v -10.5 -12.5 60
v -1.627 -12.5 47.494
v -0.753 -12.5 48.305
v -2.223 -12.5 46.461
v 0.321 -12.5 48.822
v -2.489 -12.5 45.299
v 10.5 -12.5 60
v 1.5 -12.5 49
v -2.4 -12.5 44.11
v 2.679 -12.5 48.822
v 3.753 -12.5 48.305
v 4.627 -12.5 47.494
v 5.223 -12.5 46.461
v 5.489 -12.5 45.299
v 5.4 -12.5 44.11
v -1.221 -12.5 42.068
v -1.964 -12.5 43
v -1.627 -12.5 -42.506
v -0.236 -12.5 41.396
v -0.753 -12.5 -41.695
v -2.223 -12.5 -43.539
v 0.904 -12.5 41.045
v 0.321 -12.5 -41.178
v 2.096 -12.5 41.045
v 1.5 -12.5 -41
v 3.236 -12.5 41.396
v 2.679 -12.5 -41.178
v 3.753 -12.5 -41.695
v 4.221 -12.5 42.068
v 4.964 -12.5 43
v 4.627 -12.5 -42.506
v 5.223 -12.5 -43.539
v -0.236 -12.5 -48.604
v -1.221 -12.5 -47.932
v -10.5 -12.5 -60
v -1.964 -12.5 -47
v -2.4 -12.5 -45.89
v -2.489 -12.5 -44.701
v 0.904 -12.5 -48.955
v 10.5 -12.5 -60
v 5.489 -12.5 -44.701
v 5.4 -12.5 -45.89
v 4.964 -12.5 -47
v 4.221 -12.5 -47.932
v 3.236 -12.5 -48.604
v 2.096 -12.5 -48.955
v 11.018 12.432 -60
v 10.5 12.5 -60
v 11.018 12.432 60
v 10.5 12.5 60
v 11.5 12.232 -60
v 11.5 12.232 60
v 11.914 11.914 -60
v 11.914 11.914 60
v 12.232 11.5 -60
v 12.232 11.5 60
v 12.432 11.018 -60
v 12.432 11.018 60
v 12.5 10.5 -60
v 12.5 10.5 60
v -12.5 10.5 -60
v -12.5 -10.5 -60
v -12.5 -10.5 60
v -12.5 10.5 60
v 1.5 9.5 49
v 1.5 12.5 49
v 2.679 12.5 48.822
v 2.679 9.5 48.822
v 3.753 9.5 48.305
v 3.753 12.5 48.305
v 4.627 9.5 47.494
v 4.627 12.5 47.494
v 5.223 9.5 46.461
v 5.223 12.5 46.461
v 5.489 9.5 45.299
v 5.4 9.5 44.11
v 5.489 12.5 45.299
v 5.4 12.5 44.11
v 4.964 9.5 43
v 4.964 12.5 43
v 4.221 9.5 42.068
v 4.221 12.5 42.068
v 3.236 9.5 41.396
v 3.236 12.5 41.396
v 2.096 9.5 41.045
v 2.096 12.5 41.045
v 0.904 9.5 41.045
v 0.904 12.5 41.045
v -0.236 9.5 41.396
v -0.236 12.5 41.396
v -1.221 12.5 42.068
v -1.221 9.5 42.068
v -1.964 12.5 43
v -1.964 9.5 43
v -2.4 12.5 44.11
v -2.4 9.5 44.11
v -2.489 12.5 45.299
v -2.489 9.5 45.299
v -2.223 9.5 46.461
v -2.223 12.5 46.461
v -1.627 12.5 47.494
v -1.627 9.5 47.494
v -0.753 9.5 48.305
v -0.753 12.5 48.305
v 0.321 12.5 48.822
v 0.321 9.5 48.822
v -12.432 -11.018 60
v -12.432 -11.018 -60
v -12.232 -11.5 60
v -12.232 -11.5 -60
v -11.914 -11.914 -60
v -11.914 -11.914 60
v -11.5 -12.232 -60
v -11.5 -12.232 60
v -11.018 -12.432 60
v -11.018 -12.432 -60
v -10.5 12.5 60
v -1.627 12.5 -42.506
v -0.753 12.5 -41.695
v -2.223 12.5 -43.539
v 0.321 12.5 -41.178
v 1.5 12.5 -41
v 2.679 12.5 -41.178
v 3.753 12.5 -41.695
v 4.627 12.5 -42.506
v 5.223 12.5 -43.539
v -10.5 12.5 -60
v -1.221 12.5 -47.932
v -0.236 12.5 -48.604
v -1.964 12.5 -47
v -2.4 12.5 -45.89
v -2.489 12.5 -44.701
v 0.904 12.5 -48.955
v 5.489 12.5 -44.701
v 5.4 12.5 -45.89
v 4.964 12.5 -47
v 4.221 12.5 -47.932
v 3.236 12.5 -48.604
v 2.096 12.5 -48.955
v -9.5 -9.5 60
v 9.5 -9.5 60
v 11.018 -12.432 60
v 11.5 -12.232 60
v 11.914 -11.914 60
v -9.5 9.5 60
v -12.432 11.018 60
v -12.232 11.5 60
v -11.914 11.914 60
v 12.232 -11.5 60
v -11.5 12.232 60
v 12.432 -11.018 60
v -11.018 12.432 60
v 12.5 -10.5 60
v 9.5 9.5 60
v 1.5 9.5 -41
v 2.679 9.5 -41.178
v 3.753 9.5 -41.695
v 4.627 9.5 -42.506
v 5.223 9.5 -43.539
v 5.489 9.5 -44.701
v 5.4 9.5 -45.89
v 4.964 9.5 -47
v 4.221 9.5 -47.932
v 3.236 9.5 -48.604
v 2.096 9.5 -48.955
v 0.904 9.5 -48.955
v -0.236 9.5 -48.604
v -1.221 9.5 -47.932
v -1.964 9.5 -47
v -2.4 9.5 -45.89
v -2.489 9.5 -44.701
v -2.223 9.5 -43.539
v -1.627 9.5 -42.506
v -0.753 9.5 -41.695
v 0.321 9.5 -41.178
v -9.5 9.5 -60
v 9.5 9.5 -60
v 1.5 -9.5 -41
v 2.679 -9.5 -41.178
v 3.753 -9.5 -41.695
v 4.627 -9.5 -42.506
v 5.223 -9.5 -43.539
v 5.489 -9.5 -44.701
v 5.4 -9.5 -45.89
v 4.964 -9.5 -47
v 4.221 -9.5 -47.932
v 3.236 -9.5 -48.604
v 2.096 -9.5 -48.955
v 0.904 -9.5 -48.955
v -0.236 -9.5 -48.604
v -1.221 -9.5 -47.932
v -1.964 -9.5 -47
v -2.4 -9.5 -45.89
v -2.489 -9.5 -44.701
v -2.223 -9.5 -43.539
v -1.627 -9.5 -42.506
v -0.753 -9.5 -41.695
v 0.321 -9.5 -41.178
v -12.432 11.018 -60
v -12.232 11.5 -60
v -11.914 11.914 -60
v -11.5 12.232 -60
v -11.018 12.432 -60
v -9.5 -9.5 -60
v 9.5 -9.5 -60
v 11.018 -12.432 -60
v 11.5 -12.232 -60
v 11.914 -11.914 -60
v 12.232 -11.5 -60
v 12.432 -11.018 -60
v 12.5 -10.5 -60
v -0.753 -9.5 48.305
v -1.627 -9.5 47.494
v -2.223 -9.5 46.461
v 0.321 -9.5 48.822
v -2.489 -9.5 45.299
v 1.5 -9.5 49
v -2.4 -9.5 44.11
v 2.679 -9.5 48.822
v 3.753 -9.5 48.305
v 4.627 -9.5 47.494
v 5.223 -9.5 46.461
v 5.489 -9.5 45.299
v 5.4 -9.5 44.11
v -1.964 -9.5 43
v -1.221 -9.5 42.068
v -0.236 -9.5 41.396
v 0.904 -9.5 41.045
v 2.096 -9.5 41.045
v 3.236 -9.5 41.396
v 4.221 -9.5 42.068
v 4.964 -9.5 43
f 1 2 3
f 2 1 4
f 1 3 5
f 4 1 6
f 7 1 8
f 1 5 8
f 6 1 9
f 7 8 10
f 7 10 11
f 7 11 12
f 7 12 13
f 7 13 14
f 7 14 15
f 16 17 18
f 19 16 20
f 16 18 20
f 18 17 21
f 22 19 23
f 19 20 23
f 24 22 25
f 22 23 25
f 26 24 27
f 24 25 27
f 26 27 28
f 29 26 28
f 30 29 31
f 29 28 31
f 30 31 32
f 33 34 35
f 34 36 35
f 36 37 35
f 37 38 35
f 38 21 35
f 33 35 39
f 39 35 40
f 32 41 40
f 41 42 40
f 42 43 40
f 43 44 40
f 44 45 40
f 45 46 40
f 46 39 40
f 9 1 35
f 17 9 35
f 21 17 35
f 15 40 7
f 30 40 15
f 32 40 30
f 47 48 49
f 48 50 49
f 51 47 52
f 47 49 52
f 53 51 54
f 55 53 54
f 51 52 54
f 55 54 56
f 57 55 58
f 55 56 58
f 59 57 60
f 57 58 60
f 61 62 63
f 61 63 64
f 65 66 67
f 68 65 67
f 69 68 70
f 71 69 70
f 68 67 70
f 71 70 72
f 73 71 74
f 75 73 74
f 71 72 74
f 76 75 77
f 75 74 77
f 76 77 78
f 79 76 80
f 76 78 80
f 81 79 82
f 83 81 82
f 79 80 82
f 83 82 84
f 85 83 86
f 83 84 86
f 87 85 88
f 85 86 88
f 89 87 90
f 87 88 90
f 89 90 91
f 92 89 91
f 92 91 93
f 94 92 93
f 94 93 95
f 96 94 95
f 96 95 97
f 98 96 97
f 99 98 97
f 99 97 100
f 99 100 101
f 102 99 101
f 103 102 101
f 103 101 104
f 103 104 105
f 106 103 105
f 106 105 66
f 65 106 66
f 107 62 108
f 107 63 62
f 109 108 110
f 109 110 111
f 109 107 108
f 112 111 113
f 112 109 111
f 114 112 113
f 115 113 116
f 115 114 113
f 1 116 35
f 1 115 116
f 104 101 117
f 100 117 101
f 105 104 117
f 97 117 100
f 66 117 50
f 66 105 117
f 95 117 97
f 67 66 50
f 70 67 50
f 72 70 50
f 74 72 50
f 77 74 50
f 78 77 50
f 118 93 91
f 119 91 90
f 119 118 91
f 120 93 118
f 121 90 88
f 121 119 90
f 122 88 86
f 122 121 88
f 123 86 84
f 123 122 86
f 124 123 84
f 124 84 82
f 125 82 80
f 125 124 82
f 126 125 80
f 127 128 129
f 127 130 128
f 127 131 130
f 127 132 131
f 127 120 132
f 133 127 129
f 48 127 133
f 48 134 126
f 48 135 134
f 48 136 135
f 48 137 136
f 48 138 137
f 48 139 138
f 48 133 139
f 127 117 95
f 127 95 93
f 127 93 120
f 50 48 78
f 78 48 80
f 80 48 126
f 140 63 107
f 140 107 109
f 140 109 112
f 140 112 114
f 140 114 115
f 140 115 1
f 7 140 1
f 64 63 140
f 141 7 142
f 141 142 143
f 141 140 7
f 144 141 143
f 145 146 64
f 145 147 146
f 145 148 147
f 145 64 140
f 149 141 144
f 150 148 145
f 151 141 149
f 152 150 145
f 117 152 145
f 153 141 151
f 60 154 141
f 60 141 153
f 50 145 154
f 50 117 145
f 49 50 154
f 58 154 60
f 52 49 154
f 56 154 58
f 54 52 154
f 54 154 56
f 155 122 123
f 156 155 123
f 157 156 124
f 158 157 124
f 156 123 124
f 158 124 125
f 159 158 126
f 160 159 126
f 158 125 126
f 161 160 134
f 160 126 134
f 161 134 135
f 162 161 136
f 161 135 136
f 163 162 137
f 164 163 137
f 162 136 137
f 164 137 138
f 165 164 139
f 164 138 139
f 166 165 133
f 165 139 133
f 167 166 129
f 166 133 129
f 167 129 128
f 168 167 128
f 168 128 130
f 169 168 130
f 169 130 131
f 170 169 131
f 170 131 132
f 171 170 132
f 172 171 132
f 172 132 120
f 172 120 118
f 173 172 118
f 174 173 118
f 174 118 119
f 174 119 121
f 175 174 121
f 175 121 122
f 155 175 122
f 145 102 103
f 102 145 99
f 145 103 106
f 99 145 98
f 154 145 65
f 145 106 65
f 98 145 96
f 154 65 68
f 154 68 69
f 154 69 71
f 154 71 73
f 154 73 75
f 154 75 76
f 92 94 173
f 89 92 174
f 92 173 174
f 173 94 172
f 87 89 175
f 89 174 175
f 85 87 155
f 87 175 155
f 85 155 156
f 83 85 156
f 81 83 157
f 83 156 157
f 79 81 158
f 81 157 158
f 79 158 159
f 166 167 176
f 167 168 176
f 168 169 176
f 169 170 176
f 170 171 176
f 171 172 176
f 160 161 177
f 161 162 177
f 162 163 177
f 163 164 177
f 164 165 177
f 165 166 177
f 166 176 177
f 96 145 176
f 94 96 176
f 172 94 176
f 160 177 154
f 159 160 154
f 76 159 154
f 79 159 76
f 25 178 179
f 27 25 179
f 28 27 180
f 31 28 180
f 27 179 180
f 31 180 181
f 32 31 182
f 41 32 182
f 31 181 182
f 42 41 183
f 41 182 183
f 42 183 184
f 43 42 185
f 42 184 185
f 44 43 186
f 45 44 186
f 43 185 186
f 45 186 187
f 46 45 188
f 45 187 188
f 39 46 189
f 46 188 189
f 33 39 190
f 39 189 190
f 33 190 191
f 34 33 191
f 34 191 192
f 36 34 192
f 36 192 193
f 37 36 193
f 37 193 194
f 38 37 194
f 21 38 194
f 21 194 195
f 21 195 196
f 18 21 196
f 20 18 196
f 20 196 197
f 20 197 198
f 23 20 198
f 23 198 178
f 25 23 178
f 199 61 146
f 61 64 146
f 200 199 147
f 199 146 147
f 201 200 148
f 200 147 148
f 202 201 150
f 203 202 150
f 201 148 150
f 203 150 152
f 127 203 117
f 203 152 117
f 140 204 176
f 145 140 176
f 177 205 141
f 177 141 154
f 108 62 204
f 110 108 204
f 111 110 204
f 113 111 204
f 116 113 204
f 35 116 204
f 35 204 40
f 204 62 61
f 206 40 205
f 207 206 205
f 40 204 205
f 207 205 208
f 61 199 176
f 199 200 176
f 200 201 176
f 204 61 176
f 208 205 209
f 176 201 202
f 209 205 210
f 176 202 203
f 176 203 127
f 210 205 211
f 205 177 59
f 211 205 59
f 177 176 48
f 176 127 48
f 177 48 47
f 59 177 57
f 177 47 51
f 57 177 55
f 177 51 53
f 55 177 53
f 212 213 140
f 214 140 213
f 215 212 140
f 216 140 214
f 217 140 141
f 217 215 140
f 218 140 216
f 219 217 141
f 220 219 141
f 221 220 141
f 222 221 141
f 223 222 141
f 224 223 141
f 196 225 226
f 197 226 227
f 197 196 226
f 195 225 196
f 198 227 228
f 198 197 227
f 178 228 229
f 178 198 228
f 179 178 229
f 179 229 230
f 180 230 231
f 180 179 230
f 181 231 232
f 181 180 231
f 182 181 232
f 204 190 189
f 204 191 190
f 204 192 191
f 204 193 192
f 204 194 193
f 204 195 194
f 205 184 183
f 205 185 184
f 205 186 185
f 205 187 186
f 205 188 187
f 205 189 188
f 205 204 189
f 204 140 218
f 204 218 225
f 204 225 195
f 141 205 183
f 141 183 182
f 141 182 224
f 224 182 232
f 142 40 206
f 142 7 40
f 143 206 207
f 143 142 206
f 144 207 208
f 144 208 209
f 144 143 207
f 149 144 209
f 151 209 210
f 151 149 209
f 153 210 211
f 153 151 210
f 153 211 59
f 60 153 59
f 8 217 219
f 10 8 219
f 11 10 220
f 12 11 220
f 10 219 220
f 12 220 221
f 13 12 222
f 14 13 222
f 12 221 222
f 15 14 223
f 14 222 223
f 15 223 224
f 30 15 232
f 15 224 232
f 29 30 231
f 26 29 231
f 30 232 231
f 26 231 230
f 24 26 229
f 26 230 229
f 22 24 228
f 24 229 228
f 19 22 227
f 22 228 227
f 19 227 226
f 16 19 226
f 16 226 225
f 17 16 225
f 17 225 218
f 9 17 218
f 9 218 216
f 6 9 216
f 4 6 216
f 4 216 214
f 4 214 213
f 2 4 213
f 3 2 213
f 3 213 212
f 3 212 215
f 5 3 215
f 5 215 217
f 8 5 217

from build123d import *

# Parameters (mm, degrees)
EXTRUDE_THIN1_DEPTH      = 60
EXTRUDE_THIN1_DEPTH_BACK = 60
SKETCH1_W                = 25
SKETCH1_H                = 25
SKETCH1_W_2              = 19
SKETCH1_H_2              = 19
FILLET1_R                = 2
SKETCH3_R                = 4
CUT_EXTRUDE2_DEPTH       = 67.191011474


with BuildPart() as part:
    # Sketch1 → Extrude-Thin1 (new, two sides: drawn at the far end of the back side and taken through both)
    with BuildSketch(Plane.XY.offset(-EXTRUDE_THIN1_DEPTH_BACK)):
        Rectangle(SKETCH1_W, SKETCH1_H)
        Rectangle(SKETCH1_W_2, SKETCH1_H_2, mode=Mode.SUBTRACT)
    extrude(amount=EXTRUDE_THIN1_DEPTH + EXTRUDE_THIN1_DEPTH_BACK)

    # Fillet1
    fillet1_edges = [part.edges().sort_by_distance(p)[0] for p in [
        (12.5, -12.5, 0),
        (-12.5, -12.5, 0),
        (-12.5, 12.5, 0),
        (12.5, 12.5, 0),
    ]]
    fillet(fillet1_edges, radius=FILLET1_R)

    # Sketch3 → Cut-Extrude2 (cut, through all)
    with BuildSketch(Plane(origin=(0, 12.5, 0), x_dir=(1, 0, 0), z_dir=(0, 1, 0))):
        with Locations(Location((1.5, -45, 0), (0, 0, 270))):
            Circle(SKETCH3_R)
        with Locations(Location((1.5, 45, 0), (0, 0, 270))):
            Circle(SKETCH3_R)
    extrude(amount=-CUT_EXTRUDE2_DEPTH, mode=Mode.SUBTRACT)


solid = part.part
